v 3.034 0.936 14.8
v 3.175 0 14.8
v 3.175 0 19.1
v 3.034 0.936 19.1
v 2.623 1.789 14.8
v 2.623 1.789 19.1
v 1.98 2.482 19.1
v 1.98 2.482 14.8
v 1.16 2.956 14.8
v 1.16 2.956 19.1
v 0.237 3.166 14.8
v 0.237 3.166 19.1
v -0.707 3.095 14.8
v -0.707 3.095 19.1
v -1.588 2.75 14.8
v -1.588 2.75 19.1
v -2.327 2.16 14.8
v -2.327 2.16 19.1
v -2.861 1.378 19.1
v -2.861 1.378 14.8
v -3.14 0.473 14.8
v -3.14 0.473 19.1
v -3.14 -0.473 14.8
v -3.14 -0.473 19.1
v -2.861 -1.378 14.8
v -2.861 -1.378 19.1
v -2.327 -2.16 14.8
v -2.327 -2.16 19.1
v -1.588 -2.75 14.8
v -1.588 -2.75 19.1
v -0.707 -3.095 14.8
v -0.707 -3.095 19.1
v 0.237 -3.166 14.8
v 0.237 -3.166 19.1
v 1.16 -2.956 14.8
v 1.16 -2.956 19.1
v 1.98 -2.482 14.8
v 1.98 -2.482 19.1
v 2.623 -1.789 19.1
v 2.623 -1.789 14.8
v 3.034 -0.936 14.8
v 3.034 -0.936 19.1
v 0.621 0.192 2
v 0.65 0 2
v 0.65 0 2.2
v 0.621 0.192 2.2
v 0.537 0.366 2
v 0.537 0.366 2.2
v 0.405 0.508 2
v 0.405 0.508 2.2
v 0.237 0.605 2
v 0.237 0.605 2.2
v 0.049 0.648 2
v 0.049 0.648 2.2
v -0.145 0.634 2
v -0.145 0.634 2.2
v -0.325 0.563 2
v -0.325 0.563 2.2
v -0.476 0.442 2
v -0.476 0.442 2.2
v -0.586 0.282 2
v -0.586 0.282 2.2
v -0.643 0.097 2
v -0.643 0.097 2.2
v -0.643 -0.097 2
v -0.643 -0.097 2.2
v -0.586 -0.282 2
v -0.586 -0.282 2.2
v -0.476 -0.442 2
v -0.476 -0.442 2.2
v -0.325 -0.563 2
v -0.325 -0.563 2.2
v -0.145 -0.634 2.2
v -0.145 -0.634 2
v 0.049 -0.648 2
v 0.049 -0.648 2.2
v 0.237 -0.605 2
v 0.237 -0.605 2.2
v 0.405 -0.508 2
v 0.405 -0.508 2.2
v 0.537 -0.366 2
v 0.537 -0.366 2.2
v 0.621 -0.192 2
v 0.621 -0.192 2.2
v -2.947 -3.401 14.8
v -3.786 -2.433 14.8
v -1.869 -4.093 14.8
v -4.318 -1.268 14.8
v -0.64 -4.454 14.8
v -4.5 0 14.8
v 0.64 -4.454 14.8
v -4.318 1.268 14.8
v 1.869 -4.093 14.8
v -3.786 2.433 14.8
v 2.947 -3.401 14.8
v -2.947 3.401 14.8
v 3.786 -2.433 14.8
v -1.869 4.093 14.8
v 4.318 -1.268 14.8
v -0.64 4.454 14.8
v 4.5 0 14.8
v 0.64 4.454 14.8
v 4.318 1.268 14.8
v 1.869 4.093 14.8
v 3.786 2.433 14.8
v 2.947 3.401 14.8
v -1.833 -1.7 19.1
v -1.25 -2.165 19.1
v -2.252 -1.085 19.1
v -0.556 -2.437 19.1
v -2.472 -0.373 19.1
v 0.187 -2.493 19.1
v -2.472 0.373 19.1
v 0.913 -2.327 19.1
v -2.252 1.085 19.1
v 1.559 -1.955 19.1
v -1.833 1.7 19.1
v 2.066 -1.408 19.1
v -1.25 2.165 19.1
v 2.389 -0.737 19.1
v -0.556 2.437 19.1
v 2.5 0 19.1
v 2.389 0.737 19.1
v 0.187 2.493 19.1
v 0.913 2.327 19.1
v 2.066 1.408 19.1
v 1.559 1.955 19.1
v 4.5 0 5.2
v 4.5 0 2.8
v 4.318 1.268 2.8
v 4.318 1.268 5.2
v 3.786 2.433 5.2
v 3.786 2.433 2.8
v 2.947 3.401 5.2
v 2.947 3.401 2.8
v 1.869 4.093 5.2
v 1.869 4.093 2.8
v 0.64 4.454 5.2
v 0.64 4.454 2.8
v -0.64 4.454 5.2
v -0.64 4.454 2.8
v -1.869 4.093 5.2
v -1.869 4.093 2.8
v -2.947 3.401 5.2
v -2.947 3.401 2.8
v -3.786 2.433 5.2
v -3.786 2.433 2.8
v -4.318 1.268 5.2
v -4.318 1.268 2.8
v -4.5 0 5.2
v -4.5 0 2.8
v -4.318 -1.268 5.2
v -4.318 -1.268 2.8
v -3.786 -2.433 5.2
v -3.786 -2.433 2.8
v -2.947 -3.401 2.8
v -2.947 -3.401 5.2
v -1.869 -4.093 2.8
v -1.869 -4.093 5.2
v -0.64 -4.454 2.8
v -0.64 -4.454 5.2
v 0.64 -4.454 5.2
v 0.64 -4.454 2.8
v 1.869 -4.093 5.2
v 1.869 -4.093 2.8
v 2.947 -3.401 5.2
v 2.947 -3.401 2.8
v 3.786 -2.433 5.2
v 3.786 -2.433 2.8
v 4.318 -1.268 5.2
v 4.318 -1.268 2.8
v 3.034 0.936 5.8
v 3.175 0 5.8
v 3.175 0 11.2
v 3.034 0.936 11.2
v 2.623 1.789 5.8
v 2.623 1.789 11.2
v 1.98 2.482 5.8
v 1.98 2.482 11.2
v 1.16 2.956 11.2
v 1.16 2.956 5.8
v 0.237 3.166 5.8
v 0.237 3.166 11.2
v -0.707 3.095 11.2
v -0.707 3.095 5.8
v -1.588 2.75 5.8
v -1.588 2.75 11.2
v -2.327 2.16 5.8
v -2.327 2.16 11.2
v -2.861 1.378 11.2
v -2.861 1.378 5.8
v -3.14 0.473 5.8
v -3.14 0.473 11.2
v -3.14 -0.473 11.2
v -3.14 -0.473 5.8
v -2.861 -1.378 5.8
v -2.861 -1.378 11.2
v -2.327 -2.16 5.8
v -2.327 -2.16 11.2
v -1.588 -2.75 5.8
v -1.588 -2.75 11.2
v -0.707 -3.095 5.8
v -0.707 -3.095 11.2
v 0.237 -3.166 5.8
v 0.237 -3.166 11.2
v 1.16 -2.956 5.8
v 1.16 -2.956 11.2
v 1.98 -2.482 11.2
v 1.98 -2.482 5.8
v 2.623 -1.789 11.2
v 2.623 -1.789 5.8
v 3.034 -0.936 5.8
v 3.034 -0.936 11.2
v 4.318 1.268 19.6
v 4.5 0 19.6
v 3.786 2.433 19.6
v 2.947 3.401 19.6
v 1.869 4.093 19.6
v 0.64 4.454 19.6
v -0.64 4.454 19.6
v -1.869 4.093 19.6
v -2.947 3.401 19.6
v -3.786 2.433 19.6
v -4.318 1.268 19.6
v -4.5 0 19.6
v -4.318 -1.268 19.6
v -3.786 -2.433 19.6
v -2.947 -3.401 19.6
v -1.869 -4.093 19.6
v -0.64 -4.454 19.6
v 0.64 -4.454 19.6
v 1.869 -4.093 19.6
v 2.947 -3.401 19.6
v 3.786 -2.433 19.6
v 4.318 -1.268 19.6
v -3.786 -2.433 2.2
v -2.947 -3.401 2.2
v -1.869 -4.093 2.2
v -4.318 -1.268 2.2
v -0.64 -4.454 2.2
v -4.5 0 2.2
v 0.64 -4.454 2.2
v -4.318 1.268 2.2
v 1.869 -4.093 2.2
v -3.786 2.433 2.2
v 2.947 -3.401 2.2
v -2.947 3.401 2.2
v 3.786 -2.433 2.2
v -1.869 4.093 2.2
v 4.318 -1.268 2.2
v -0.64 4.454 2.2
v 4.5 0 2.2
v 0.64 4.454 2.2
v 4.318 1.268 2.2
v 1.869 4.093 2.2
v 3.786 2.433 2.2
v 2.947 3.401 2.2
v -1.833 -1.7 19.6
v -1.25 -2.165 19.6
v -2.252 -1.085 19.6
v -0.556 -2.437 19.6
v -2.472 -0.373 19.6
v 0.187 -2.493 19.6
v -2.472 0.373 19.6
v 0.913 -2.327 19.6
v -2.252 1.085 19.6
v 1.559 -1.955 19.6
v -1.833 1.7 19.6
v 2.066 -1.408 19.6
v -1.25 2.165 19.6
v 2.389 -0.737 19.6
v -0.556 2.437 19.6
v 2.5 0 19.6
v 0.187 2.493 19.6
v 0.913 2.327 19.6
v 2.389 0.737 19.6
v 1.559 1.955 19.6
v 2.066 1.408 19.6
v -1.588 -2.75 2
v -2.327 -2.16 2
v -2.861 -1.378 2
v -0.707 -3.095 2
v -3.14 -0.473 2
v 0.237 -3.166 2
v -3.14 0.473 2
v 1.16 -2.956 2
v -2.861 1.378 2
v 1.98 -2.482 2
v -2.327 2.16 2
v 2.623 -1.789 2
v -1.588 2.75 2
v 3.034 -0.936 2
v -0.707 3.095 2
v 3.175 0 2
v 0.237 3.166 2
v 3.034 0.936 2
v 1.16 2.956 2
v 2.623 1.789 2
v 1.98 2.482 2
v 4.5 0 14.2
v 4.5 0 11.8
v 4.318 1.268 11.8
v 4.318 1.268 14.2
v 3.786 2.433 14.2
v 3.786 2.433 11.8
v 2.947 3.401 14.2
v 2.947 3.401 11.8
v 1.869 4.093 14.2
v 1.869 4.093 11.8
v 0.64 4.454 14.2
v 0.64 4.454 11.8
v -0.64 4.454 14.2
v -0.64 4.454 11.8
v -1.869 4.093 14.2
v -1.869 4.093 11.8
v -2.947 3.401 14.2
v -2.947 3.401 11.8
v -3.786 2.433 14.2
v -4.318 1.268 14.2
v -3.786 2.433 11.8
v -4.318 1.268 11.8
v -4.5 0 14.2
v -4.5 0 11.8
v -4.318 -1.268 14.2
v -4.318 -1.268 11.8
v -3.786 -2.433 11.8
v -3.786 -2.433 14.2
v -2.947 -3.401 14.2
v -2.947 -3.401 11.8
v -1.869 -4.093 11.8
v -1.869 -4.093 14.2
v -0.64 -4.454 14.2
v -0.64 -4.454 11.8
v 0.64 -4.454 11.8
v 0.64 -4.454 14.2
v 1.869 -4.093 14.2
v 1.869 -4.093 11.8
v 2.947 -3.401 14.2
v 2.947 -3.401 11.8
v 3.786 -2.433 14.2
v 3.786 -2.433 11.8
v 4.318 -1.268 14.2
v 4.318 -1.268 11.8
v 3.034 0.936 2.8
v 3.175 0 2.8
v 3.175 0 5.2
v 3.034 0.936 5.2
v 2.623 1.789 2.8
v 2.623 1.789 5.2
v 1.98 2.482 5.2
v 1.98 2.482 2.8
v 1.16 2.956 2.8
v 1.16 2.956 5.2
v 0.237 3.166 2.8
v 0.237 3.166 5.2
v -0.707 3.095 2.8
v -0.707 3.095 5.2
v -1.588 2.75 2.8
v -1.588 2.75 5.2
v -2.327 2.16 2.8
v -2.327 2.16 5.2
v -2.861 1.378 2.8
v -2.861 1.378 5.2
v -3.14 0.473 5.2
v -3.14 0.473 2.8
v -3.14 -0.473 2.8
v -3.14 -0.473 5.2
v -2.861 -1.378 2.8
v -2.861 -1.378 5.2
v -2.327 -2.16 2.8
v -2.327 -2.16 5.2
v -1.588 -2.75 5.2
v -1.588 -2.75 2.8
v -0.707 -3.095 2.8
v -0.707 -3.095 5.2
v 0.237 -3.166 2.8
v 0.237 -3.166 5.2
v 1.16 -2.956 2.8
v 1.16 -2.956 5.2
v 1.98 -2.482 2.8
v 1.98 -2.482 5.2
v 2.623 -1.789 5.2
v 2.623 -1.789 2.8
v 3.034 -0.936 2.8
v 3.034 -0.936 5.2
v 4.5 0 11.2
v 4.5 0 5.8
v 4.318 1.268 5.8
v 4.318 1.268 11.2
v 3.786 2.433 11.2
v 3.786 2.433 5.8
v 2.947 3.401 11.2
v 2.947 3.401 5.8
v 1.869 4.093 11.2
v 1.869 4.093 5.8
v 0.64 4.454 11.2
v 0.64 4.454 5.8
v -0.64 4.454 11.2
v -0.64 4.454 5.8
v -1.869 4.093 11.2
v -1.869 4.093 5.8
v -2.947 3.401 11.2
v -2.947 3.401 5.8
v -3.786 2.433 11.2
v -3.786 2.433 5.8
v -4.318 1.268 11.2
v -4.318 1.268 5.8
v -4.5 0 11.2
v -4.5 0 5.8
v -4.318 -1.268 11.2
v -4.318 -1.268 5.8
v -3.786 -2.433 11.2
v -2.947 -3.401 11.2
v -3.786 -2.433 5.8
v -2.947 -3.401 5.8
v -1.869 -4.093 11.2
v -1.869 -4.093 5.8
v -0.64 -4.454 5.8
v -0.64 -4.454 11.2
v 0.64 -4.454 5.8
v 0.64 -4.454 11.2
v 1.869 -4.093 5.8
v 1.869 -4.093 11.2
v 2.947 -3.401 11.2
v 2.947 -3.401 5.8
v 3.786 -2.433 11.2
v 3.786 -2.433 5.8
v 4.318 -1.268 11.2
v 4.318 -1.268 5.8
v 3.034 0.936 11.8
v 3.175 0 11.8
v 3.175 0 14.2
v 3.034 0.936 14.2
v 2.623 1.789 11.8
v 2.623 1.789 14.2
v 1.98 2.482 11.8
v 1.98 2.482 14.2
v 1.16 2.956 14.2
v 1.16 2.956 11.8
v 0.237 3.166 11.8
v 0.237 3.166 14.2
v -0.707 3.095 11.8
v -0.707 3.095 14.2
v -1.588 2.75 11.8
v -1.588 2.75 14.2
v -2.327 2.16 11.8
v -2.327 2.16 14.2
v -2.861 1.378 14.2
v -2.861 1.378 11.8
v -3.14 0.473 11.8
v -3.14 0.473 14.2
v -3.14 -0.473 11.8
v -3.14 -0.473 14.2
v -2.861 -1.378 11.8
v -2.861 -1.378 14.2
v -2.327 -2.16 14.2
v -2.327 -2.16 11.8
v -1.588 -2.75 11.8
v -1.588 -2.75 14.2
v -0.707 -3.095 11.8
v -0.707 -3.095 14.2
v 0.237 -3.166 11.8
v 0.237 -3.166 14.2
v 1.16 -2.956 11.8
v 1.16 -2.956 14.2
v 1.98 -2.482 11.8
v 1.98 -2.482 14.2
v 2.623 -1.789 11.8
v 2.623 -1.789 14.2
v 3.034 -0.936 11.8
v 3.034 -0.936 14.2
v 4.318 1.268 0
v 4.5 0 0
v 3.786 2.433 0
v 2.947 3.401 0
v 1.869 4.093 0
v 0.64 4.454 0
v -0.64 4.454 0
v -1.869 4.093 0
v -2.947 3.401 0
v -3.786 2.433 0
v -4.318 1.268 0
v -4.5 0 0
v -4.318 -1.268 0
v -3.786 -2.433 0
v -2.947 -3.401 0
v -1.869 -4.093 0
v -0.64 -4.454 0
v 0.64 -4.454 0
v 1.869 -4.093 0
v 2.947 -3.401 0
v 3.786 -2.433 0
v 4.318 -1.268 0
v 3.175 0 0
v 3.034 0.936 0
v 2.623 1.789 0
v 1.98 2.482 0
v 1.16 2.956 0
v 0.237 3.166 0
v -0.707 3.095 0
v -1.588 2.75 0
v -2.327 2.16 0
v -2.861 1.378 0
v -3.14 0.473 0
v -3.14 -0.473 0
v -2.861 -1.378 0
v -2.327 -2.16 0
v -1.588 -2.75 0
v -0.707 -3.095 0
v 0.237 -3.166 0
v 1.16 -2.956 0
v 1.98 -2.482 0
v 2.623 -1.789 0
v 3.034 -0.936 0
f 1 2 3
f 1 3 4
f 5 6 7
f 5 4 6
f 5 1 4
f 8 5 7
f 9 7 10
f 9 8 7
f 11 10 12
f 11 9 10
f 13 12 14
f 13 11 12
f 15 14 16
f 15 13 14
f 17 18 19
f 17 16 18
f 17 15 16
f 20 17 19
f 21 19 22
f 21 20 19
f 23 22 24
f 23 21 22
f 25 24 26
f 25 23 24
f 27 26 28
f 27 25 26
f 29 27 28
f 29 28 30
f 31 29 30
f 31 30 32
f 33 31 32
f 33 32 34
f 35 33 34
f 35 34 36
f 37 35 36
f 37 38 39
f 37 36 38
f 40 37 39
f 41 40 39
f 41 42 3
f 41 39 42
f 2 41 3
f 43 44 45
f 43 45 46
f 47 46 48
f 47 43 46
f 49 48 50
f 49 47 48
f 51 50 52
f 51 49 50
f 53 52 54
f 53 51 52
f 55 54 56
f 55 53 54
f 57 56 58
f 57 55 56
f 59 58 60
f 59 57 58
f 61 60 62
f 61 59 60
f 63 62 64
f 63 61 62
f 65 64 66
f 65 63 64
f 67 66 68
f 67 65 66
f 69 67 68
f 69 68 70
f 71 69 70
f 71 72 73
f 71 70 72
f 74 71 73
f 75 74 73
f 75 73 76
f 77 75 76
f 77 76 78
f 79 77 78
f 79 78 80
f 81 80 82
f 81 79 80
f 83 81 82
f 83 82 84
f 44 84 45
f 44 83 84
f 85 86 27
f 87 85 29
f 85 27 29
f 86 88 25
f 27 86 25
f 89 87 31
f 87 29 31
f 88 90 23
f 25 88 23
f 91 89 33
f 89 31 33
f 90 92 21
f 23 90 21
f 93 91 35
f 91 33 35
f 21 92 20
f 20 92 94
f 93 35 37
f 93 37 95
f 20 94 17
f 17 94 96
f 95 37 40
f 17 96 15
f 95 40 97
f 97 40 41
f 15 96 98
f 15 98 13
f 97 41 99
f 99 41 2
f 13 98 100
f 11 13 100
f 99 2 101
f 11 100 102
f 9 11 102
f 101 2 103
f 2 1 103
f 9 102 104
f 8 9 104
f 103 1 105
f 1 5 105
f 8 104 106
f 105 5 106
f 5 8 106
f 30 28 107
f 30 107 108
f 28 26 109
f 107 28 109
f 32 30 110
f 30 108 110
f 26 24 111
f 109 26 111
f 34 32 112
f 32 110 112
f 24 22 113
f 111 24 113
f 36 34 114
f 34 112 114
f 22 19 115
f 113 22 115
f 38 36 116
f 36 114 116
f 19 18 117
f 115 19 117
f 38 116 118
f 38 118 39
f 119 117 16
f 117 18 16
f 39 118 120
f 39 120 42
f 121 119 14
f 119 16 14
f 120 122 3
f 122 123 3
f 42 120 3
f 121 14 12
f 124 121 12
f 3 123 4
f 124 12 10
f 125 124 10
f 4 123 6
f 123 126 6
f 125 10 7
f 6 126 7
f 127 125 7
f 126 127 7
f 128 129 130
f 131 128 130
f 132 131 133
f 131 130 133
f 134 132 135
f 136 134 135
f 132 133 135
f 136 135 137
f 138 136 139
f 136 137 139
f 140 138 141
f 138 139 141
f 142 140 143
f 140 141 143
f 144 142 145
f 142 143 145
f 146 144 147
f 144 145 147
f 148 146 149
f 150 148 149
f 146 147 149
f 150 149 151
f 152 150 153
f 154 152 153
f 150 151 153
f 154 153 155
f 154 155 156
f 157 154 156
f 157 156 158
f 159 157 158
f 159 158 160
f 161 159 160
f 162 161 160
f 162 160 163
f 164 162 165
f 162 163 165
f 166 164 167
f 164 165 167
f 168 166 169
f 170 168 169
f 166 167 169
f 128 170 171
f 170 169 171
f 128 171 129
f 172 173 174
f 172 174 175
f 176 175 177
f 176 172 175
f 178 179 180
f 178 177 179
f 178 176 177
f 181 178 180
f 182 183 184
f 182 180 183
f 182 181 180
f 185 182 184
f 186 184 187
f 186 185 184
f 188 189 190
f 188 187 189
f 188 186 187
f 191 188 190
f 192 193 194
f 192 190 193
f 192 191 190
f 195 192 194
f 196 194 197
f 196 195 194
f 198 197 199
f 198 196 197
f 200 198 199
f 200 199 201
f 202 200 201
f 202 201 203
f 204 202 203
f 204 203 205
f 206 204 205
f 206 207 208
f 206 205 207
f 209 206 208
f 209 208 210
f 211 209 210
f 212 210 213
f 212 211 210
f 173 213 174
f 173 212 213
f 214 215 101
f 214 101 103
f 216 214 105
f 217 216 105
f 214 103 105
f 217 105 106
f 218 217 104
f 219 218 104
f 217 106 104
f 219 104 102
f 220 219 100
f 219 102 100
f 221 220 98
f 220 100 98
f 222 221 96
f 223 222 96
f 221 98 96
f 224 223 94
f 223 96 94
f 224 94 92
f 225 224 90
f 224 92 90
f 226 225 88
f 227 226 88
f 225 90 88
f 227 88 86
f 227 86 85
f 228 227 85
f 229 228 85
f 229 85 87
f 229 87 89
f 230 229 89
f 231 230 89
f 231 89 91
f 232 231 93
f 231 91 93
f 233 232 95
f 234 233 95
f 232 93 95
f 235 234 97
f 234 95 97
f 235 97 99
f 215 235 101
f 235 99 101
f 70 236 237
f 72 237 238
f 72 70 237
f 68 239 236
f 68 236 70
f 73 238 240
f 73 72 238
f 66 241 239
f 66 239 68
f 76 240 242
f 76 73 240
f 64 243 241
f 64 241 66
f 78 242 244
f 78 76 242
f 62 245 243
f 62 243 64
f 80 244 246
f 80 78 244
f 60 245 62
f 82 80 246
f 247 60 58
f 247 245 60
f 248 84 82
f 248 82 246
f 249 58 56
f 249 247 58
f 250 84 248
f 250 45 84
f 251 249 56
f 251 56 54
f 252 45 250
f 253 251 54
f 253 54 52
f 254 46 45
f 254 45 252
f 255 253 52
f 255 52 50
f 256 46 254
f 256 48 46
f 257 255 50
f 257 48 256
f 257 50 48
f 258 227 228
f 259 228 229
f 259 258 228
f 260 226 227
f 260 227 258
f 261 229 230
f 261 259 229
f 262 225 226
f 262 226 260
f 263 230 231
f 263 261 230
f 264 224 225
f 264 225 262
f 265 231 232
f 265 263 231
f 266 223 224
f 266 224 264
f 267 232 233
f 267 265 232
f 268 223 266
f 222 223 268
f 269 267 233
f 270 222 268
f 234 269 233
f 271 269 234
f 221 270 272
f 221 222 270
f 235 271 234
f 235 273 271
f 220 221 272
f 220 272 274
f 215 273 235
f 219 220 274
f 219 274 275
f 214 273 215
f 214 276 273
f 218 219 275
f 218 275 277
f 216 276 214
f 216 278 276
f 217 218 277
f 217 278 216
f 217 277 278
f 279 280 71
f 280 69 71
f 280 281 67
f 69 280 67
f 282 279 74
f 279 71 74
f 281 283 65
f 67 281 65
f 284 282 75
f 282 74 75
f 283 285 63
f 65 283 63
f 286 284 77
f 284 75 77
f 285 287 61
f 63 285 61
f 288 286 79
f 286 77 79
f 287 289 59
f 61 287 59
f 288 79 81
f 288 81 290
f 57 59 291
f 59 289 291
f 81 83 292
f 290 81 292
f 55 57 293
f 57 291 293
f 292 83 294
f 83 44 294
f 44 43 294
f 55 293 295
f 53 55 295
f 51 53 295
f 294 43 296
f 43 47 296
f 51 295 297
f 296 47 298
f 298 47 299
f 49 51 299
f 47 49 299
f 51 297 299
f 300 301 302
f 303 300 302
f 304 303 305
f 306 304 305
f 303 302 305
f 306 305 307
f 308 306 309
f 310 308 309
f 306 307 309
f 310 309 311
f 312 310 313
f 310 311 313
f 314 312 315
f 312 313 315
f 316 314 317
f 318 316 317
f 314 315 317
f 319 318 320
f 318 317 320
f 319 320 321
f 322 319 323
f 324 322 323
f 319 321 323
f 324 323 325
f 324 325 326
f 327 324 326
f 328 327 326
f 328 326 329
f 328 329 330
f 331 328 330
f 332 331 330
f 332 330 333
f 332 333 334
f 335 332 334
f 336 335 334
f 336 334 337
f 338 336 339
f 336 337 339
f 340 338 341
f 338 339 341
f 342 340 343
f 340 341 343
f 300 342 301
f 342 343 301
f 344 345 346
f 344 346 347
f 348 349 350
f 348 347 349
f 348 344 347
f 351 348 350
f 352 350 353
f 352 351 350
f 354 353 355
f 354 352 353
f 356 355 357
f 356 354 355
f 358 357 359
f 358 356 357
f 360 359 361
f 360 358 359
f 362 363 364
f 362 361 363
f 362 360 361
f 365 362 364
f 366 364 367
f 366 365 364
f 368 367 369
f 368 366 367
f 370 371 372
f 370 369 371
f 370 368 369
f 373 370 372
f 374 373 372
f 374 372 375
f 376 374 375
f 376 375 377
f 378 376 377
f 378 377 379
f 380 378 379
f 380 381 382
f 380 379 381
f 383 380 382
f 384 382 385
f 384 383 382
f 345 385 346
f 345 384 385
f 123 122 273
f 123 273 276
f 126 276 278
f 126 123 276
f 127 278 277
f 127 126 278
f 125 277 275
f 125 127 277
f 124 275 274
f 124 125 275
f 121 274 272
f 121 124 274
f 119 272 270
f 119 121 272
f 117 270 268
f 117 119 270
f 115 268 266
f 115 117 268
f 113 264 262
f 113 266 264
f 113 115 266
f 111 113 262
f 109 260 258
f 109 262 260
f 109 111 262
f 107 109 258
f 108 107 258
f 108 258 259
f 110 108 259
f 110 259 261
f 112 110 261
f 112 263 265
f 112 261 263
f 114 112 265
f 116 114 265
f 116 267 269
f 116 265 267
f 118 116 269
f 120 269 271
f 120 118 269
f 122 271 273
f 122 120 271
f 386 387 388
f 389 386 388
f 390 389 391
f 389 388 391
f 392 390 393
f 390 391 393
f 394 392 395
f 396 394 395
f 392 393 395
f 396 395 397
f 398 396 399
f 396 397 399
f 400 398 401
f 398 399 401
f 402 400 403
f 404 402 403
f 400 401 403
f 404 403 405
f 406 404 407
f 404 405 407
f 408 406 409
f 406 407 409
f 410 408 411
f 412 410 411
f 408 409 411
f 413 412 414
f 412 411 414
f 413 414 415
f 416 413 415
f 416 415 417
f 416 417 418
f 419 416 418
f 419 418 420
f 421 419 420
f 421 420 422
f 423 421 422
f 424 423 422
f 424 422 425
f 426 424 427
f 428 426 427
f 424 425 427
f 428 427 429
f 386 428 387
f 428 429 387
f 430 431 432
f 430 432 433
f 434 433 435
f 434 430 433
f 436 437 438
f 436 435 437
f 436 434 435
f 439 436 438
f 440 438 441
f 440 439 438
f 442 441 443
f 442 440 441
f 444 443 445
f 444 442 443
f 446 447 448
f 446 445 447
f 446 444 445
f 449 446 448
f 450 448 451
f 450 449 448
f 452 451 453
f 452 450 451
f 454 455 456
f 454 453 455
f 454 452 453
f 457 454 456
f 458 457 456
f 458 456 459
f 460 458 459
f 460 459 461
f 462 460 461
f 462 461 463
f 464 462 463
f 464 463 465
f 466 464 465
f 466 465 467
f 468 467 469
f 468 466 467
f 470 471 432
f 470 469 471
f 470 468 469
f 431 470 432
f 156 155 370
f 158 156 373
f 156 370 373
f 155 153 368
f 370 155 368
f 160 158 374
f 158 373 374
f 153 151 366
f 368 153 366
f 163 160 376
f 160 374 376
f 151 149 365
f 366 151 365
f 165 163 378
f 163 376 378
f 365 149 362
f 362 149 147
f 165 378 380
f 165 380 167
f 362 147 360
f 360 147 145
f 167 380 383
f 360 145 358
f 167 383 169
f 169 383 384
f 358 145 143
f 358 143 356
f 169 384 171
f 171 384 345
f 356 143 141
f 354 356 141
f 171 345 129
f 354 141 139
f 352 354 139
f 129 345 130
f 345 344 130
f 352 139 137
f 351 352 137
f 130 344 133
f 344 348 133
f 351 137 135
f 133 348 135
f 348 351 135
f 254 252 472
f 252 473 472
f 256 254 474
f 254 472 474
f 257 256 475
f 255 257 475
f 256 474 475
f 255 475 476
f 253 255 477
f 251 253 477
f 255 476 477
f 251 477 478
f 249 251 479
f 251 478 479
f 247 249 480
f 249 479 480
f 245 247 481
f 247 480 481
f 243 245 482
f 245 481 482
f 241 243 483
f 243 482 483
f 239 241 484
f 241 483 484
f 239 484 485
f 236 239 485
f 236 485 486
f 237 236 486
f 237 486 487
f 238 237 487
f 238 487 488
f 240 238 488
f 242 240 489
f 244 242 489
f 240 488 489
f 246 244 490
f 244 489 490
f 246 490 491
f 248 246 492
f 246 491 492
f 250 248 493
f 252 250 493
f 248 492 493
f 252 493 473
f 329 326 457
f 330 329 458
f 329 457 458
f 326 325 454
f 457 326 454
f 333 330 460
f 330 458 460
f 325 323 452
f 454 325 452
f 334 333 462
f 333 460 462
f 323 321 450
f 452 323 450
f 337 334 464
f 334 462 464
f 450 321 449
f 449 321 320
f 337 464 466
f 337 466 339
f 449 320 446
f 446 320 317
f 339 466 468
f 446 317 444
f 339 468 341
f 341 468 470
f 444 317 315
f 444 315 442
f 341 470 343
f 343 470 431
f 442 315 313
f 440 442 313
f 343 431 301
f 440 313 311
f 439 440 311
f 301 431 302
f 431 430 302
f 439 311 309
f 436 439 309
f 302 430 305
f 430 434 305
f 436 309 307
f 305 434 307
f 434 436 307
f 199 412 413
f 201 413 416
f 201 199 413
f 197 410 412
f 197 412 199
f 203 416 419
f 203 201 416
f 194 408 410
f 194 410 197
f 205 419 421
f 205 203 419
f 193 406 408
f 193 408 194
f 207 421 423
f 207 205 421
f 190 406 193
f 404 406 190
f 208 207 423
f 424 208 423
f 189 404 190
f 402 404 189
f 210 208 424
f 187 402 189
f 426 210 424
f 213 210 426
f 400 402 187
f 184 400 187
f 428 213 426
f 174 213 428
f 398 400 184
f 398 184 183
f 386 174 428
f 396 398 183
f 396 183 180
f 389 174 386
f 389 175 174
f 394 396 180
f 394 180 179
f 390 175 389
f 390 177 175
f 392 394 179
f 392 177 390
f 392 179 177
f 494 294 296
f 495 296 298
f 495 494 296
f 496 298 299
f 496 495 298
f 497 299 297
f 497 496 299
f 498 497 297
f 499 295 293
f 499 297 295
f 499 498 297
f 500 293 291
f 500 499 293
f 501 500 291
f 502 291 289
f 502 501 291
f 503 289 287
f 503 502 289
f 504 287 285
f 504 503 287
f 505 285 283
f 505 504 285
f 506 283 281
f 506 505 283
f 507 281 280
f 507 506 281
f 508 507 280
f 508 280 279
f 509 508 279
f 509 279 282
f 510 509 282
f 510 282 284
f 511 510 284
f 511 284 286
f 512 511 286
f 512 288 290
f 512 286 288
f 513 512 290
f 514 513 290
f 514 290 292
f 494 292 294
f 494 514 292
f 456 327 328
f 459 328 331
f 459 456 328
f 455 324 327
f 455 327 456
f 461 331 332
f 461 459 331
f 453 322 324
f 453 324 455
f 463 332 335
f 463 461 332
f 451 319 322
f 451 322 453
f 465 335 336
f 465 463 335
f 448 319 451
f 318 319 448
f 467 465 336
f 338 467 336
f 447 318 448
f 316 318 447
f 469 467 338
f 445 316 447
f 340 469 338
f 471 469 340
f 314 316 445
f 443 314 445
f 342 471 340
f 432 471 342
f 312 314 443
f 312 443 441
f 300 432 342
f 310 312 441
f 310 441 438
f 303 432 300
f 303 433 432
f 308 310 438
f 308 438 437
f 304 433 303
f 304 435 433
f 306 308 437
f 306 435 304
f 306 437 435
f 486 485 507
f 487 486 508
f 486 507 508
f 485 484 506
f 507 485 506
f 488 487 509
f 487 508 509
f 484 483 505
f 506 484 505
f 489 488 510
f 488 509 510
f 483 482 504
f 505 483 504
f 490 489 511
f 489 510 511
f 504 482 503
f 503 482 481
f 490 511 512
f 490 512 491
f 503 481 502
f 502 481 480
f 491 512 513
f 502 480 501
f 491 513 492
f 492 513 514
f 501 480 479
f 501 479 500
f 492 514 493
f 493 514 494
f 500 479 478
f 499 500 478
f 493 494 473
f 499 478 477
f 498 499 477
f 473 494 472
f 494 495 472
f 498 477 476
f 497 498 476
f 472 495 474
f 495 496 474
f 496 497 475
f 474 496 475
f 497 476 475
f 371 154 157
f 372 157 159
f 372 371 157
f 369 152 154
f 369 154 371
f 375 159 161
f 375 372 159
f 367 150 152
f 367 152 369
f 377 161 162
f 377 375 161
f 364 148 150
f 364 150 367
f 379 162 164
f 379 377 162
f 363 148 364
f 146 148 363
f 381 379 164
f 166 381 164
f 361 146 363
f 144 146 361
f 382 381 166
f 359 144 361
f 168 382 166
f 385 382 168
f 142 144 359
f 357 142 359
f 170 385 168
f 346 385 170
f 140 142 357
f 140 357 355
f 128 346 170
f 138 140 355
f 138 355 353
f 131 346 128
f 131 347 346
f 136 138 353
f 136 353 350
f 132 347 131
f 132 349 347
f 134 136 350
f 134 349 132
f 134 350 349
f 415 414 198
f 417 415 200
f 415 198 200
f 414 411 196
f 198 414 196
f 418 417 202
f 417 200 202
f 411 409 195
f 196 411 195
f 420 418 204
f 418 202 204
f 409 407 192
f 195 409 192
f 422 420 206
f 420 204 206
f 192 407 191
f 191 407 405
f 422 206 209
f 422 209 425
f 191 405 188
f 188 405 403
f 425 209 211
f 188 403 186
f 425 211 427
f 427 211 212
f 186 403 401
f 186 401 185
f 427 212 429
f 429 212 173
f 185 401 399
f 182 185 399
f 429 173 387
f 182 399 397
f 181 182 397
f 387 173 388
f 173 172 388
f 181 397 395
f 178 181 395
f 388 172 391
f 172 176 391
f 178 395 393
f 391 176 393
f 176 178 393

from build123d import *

# Parameters (mm, degrees)
CYLINDER019_R     = 2.5
CYLINDER019_DEPTH = 25
CYLINDER017_R     = 4.5
CYLINDER017_DEPTH = 0.5
CYLINDER016_R     = 0.65
CYLINDER016_DEPTH = 25
CYLINDER018_R     = 4.5
CYLINDER018_DEPTH = 0.2
CYLINDER012_R     = 3.175
CYLINDER012_DEPTH = 25
CYLINDER015_R     = 2
CYLINDER015_DEPTH = 2
CYLINDER021_R     = 4.5
CYLINDER021_DEPTH = 2.4
CYLINDER014_R     = 4.5
CYLINDER014_DEPTH = 5.4
CYLINDER022_R     = 4.5
CYLINDER022_DEPTH = 2.4
CYLINDER020_R     = 4.5
CYLINDER020_DEPTH = 4.8
CYLINDER013_R     = 4.5
CYLINDER013_DEPTH = 2.2


with BuildPart() as aperture004:
    # Cylinder019 → Cylinder019 (new body)
    with BuildSketch(Plane.XY.offset(10)):
        Circle(CYLINDER019_R)
    extrude(amount=CYLINDER019_DEPTH)


with BuildPart() as cut005:
    # Cylinder017 → Cylinder017 (new body)
    with BuildSketch(Plane.XY.offset(19.1)):
        Circle(CYLINDER017_R)
    extrude(amount=CYLINDER017_DEPTH)

    # Cut005: cut Aperture004
    add(aperture004.part, mode=Mode.SUBTRACT)


with BuildPart() as aperture003:
    # Cylinder016 → Cylinder016 (new body)
    with BuildSketch(Plane.XY):
        Circle(CYLINDER016_R)
    extrude(amount=CYLINDER016_DEPTH)


with BuildPart() as cut007:
    # Cylinder018 → Cylinder018 (new body)
    with BuildSketch(Plane.XY.offset(2)):
        Circle(CYLINDER018_R)
    extrude(amount=CYLINDER018_DEPTH)

    # Cut007: cut Aperture003
    add(aperture003.part, mode=Mode.SUBTRACT)


with BuildPart() as inner_radius001:
    # Cylinder012 → Cylinder012 (new body)
    with BuildSketch(Plane.XY):
        Circle(CYLINDER012_R)
    extrude(amount=CYLINDER012_DEPTH)


with BuildPart() as cylinder015:
    # Cylinder015 → Cylinder015 (new body)
    with BuildSketch(Plane.XY.offset(2.5)):
        Circle(CYLINDER015_R)
    extrude(amount=CYLINDER015_DEPTH)


with BuildPart() as einzel007:
    # Cylinder021 → Cylinder021 (new body)
    with BuildSketch(Plane.XY.offset(2.8)):
        Circle(CYLINDER021_R)
    extrude(amount=CYLINDER021_DEPTH)


with BuildPart() as einzel005:
    # Cylinder014 → Cylinder014 (new body)
    with BuildSketch(Plane.XY.offset(5.8)):
        Circle(CYLINDER014_R)
    extrude(amount=CYLINDER014_DEPTH)


with BuildPart() as einzel008:
    # Cylinder022 → Cylinder022 (new body)
    with BuildSketch(Plane.XY.offset(11.8)):
        Circle(CYLINDER022_R)
    extrude(amount=CYLINDER022_DEPTH)


with BuildPart() as einzel006:
    # Cylinder020 → Cylinder020 (new body)
    with BuildSketch(Plane.XY.offset(14.8)):
        Circle(CYLINDER020_R)
    extrude(amount=CYLINDER020_DEPTH)


with BuildPart() as fusion003:
    # Cylinder013 → Cylinder013 (new body)
    with BuildSketch(Plane.XY):
        Circle(CYLINDER013_R)
    extrude(amount=CYLINDER013_DEPTH)

    # Fusion002: union Cylinder015, Einzel007, Einzel005, Einzel008, Einzel006
    add(cylinder015.part)
    add(einzel007.part)
    add(einzel005.part)
    add(einzel008.part)
    add(einzel006.part)

    # Cut006: cut Inner radius001
    add(inner_radius001.part, mode=Mode.SUBTRACT)

    # Fusion003: union Cut005, Cut007
    add(cut005.part)
    add(cut007.part)


solid = fusion003.part
